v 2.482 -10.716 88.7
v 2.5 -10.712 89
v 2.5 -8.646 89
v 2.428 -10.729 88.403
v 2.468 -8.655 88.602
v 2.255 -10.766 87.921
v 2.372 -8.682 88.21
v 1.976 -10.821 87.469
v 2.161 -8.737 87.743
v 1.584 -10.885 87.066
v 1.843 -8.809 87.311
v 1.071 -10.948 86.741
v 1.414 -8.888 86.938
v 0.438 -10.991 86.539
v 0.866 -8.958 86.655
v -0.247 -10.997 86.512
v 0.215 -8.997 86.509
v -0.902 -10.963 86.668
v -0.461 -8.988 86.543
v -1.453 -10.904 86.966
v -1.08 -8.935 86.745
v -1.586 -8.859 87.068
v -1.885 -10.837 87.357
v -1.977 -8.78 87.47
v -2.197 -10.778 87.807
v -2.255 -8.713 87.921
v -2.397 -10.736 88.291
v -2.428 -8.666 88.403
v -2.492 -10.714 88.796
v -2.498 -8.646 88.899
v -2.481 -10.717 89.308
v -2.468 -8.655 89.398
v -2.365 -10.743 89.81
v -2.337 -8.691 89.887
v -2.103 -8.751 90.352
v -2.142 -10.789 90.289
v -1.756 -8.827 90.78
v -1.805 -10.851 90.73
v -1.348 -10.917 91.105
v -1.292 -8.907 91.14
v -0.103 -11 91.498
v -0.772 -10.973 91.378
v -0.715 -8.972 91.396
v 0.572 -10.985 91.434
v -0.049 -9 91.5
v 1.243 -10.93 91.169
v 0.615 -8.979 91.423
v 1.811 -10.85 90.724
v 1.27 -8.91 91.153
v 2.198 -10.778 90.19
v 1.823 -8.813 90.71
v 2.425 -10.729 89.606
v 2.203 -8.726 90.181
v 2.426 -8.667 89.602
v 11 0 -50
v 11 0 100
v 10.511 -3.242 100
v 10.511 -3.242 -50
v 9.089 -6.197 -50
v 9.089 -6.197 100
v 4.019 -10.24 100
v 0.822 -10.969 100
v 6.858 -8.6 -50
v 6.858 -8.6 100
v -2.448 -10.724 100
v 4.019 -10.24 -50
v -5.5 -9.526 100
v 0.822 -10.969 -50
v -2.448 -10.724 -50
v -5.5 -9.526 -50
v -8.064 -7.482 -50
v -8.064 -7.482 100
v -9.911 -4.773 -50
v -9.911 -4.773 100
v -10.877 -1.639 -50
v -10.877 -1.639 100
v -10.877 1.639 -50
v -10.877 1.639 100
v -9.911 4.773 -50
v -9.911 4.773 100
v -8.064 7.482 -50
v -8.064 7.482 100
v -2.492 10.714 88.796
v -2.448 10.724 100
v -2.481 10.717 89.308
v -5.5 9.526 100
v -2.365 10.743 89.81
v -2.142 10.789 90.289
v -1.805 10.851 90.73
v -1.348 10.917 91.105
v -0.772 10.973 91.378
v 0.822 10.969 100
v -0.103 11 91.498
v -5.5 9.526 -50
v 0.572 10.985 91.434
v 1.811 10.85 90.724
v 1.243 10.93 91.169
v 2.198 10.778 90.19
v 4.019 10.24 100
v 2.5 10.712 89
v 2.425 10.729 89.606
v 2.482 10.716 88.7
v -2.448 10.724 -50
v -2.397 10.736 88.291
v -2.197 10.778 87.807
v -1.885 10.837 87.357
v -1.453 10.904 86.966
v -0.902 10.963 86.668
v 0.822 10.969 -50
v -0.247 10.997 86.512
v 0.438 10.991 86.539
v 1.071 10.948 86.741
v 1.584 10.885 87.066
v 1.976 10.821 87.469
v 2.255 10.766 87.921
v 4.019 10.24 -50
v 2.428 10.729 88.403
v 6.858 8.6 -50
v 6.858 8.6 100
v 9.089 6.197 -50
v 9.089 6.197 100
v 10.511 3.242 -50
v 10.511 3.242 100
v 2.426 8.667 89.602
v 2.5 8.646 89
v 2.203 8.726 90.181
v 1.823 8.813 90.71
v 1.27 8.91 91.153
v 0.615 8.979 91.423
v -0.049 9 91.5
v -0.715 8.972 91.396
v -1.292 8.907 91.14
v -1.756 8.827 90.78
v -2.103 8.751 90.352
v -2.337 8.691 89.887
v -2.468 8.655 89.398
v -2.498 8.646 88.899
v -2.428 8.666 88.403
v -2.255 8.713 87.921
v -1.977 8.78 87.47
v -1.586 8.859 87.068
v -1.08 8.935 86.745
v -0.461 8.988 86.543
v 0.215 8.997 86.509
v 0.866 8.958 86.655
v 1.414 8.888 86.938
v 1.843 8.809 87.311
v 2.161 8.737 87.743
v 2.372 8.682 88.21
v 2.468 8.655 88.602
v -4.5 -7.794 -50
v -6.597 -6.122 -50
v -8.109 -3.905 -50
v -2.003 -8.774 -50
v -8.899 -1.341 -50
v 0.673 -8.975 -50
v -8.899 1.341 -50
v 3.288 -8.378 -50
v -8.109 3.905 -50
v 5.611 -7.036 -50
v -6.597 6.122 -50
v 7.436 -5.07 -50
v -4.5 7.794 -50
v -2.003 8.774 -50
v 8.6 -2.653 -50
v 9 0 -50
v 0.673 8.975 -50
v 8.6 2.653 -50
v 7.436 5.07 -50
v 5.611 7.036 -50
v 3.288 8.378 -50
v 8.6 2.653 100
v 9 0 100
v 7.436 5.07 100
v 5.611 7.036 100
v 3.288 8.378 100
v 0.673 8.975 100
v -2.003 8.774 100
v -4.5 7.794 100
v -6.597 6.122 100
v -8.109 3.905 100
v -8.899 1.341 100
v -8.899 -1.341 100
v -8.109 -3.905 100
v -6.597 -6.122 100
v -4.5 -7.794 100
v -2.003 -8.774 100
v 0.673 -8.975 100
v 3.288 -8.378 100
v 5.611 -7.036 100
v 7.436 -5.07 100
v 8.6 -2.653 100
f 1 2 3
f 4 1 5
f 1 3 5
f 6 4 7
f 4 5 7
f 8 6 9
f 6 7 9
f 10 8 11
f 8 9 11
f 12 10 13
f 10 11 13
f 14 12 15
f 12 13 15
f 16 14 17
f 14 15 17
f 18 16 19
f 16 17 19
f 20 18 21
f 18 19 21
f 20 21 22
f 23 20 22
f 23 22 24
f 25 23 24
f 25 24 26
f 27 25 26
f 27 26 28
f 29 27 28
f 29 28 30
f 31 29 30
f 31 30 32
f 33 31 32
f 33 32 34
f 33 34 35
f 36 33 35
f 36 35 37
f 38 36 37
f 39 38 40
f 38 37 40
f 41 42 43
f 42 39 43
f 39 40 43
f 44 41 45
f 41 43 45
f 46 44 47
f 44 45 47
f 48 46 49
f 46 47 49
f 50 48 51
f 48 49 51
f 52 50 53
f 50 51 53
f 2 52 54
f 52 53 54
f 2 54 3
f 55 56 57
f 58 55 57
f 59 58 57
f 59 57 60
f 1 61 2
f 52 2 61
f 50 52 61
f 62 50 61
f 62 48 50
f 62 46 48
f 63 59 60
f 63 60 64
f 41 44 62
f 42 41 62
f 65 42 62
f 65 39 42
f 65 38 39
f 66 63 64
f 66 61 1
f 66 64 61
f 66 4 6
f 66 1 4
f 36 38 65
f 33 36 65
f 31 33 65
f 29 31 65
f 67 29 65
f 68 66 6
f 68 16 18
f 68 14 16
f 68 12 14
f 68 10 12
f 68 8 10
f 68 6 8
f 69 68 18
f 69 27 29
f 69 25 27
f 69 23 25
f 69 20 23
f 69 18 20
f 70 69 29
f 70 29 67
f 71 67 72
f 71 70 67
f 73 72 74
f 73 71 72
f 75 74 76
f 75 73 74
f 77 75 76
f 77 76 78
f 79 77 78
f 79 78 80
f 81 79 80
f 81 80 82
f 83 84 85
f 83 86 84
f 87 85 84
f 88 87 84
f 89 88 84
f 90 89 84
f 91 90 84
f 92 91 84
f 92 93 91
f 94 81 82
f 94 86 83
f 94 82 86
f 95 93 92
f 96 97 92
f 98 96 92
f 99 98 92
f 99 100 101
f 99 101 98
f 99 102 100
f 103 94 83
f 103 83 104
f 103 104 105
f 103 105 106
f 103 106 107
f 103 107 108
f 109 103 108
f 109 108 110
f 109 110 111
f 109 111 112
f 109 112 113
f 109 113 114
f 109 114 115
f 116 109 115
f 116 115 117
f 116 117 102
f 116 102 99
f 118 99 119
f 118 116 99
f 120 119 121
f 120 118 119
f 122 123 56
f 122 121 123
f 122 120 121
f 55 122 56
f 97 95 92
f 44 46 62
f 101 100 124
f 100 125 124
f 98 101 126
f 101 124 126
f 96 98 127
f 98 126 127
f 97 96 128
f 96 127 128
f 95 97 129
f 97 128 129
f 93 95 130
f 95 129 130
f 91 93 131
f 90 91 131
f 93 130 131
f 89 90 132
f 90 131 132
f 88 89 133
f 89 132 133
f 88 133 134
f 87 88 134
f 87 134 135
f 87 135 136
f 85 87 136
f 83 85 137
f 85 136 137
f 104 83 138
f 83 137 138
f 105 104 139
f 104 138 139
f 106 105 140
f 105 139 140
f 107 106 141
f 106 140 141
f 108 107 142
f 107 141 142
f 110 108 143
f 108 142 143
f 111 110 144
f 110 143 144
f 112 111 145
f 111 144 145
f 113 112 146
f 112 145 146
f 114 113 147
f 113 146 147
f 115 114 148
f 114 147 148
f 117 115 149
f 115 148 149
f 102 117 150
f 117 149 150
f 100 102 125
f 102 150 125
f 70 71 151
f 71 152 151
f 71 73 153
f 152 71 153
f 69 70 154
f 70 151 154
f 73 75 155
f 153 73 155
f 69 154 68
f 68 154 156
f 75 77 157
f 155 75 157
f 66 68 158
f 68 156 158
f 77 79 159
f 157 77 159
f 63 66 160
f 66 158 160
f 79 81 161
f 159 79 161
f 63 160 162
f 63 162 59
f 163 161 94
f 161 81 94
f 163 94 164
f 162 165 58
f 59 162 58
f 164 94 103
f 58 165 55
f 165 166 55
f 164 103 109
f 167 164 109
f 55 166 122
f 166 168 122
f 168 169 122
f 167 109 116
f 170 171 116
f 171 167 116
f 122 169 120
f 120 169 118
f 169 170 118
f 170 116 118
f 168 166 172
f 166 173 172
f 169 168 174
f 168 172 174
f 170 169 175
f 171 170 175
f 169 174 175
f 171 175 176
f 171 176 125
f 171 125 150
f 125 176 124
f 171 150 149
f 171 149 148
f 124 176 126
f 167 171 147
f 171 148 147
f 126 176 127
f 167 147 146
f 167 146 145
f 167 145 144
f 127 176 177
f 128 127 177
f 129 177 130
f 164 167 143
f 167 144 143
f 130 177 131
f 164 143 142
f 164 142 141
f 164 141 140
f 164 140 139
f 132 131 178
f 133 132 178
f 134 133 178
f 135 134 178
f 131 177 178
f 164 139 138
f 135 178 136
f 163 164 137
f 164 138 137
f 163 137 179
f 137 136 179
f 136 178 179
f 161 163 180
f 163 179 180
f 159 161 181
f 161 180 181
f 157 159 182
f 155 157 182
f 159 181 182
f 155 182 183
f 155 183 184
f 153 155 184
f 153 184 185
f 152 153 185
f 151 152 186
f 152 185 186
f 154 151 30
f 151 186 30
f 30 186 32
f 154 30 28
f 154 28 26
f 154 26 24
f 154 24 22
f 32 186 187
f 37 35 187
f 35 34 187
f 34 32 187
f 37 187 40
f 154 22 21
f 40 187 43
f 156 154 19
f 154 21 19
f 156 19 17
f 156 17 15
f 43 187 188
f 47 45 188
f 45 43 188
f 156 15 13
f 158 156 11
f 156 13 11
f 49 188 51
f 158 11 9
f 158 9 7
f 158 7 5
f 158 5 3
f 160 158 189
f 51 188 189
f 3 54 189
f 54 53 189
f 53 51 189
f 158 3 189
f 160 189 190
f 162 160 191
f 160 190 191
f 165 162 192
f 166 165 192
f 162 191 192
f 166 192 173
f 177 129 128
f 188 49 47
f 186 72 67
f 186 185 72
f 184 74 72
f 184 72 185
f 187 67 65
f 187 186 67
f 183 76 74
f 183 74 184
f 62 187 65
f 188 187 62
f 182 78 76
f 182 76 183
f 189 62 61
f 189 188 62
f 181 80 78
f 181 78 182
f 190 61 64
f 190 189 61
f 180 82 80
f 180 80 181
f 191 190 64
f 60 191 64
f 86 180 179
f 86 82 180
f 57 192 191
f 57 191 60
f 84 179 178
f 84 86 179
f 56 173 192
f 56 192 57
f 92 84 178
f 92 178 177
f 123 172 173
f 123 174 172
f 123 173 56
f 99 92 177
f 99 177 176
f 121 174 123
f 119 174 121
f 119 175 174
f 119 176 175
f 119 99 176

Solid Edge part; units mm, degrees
sketch "Sketch1" plane through (0, 0, 0) normal (0, 0, 1) x (1, 0, 0)
  circle A0 centre (0, 0) radius 11
extrude "Protrusion1" add sketch "Sketch1" along normal mid plane 200
sketch "Sketch2" plane through (0, 0, 100) normal (0, 0, 1) x (1, 0, 0)
  circle A0 centre (0, 0) radius 9
extrude "Cutout1" cut sketch "Sketch2" against normal up to vertex (200 mm away)
sketch "Sketch3" plane through (0, 0, 0) normal (0, -1, 0) x (1, 0, 0)
  circle A0 centre (0, 89) radius 2.5
extrude "ExtrudedCutout_2" cut sketch "Sketch3" along normal mid plane 30
sketch "Sketch4" plane through (0, 0, -100) normal (0, 0, -1) x (1, 0, 0)
  line L0 (-11, 20) -> (19, 20)
  line L1 (19, 20) -> (19.5245, -19.9966)
  line L2 (19.5245, -19.9966) -> (-13.1942, -19.0394)
  line L3 (-13.1942, -19.0394) -> (-11, 20)
extrude "ExtrudedCutout_3" cut sketch "Sketch4" against normal blind 50
